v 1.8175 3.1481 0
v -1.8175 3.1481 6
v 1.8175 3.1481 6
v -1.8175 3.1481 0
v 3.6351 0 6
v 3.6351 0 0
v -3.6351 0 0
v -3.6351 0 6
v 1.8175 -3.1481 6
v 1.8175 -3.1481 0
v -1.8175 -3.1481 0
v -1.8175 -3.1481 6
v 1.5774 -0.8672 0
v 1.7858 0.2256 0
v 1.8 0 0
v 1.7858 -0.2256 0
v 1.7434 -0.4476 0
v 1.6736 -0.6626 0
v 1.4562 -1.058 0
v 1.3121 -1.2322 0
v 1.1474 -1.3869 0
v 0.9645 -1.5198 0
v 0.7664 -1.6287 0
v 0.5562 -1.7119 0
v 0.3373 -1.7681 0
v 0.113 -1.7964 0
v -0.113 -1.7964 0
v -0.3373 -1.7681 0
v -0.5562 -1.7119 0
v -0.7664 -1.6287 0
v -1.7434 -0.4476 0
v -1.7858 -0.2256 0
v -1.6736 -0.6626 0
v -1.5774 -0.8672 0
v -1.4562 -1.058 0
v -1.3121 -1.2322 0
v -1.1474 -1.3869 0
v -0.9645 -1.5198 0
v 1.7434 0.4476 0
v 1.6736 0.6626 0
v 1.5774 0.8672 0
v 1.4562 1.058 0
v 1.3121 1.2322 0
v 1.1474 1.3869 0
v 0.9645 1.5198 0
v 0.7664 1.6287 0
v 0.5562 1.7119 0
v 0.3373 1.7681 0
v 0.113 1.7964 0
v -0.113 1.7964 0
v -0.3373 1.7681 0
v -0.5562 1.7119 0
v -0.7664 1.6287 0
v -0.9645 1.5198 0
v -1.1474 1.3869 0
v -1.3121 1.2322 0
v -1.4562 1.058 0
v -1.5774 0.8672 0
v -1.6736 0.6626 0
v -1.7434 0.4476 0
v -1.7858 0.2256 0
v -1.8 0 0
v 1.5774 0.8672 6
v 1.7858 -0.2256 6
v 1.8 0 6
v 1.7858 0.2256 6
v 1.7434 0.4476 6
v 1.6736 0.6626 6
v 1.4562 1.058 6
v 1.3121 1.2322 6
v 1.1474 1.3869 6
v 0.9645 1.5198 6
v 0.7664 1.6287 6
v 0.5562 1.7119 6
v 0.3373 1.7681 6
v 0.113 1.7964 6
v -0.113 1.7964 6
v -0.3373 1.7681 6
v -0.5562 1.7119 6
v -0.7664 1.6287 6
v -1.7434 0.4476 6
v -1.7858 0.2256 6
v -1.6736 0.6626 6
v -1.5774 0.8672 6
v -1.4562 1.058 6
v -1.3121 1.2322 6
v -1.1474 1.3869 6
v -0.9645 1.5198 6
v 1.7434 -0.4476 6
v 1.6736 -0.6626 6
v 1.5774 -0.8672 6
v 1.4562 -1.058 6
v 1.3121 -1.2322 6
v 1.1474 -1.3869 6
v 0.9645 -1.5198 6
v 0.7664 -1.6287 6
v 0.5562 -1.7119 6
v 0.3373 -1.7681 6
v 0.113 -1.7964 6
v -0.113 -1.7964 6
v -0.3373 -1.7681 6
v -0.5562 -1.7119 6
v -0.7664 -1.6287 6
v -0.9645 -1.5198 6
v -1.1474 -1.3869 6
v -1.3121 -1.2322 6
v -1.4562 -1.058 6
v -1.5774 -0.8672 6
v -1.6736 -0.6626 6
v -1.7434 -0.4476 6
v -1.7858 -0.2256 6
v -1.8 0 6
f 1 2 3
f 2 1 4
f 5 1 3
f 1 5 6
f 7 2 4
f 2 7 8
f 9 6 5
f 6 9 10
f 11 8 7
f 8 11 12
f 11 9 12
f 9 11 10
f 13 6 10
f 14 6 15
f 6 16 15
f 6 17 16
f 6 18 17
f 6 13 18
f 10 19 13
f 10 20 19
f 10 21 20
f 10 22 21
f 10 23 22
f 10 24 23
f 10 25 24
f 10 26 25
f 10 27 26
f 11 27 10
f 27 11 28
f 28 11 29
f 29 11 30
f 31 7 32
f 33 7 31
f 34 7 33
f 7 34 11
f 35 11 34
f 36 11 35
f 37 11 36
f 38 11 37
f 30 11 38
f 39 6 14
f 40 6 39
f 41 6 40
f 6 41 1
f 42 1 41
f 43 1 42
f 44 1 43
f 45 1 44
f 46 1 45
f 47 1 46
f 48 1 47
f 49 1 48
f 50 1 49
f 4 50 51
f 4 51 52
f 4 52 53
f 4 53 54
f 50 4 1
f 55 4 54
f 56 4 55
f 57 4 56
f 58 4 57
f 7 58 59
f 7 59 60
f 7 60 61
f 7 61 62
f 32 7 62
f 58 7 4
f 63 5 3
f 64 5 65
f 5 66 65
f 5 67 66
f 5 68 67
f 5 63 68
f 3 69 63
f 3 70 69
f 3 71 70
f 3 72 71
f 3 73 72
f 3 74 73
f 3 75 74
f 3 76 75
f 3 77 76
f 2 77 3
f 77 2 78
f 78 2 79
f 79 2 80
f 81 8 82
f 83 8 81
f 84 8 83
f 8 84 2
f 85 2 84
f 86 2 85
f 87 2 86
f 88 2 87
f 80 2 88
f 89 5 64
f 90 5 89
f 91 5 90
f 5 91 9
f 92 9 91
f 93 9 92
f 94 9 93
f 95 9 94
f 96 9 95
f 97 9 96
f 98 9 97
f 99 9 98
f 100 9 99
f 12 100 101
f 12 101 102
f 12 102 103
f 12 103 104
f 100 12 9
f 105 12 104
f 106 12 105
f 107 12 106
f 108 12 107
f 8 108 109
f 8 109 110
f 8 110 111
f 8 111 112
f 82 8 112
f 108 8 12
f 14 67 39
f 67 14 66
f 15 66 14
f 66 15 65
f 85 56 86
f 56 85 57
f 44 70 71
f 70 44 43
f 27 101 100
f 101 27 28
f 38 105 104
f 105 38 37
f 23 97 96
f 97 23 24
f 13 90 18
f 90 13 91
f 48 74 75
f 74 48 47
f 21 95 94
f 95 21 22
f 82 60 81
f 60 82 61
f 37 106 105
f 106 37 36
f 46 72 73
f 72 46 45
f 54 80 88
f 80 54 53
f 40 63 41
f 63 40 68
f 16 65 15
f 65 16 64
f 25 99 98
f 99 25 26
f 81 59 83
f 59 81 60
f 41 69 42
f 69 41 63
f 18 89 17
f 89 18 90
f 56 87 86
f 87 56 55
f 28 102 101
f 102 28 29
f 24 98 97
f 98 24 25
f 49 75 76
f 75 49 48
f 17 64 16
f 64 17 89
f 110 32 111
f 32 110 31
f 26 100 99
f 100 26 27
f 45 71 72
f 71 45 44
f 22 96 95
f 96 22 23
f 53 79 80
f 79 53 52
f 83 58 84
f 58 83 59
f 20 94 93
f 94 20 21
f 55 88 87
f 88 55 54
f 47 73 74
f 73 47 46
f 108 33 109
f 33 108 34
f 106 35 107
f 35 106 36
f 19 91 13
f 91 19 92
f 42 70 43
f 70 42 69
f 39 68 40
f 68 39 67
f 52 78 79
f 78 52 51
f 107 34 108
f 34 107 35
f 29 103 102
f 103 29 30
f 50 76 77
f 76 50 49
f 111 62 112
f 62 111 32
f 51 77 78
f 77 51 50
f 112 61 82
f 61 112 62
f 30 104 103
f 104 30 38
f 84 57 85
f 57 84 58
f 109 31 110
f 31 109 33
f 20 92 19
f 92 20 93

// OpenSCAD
$fn = 50;


difference() {
	union() {
		linear_extrude(height = 6) {
			polygon(points = [[3.6351000000, 0.0000000000], [1.8175500000, 3.1480889453], [-1.8175500000, 3.1480889453], [-3.6351000000, 0.0000000000], [-1.8175500000, -3.1480889453], [1.8175500000, -3.1480889453]]);
		}
	}
	union() {
		cylinder(h = 6, r = 1.8000000000);
	}
}
